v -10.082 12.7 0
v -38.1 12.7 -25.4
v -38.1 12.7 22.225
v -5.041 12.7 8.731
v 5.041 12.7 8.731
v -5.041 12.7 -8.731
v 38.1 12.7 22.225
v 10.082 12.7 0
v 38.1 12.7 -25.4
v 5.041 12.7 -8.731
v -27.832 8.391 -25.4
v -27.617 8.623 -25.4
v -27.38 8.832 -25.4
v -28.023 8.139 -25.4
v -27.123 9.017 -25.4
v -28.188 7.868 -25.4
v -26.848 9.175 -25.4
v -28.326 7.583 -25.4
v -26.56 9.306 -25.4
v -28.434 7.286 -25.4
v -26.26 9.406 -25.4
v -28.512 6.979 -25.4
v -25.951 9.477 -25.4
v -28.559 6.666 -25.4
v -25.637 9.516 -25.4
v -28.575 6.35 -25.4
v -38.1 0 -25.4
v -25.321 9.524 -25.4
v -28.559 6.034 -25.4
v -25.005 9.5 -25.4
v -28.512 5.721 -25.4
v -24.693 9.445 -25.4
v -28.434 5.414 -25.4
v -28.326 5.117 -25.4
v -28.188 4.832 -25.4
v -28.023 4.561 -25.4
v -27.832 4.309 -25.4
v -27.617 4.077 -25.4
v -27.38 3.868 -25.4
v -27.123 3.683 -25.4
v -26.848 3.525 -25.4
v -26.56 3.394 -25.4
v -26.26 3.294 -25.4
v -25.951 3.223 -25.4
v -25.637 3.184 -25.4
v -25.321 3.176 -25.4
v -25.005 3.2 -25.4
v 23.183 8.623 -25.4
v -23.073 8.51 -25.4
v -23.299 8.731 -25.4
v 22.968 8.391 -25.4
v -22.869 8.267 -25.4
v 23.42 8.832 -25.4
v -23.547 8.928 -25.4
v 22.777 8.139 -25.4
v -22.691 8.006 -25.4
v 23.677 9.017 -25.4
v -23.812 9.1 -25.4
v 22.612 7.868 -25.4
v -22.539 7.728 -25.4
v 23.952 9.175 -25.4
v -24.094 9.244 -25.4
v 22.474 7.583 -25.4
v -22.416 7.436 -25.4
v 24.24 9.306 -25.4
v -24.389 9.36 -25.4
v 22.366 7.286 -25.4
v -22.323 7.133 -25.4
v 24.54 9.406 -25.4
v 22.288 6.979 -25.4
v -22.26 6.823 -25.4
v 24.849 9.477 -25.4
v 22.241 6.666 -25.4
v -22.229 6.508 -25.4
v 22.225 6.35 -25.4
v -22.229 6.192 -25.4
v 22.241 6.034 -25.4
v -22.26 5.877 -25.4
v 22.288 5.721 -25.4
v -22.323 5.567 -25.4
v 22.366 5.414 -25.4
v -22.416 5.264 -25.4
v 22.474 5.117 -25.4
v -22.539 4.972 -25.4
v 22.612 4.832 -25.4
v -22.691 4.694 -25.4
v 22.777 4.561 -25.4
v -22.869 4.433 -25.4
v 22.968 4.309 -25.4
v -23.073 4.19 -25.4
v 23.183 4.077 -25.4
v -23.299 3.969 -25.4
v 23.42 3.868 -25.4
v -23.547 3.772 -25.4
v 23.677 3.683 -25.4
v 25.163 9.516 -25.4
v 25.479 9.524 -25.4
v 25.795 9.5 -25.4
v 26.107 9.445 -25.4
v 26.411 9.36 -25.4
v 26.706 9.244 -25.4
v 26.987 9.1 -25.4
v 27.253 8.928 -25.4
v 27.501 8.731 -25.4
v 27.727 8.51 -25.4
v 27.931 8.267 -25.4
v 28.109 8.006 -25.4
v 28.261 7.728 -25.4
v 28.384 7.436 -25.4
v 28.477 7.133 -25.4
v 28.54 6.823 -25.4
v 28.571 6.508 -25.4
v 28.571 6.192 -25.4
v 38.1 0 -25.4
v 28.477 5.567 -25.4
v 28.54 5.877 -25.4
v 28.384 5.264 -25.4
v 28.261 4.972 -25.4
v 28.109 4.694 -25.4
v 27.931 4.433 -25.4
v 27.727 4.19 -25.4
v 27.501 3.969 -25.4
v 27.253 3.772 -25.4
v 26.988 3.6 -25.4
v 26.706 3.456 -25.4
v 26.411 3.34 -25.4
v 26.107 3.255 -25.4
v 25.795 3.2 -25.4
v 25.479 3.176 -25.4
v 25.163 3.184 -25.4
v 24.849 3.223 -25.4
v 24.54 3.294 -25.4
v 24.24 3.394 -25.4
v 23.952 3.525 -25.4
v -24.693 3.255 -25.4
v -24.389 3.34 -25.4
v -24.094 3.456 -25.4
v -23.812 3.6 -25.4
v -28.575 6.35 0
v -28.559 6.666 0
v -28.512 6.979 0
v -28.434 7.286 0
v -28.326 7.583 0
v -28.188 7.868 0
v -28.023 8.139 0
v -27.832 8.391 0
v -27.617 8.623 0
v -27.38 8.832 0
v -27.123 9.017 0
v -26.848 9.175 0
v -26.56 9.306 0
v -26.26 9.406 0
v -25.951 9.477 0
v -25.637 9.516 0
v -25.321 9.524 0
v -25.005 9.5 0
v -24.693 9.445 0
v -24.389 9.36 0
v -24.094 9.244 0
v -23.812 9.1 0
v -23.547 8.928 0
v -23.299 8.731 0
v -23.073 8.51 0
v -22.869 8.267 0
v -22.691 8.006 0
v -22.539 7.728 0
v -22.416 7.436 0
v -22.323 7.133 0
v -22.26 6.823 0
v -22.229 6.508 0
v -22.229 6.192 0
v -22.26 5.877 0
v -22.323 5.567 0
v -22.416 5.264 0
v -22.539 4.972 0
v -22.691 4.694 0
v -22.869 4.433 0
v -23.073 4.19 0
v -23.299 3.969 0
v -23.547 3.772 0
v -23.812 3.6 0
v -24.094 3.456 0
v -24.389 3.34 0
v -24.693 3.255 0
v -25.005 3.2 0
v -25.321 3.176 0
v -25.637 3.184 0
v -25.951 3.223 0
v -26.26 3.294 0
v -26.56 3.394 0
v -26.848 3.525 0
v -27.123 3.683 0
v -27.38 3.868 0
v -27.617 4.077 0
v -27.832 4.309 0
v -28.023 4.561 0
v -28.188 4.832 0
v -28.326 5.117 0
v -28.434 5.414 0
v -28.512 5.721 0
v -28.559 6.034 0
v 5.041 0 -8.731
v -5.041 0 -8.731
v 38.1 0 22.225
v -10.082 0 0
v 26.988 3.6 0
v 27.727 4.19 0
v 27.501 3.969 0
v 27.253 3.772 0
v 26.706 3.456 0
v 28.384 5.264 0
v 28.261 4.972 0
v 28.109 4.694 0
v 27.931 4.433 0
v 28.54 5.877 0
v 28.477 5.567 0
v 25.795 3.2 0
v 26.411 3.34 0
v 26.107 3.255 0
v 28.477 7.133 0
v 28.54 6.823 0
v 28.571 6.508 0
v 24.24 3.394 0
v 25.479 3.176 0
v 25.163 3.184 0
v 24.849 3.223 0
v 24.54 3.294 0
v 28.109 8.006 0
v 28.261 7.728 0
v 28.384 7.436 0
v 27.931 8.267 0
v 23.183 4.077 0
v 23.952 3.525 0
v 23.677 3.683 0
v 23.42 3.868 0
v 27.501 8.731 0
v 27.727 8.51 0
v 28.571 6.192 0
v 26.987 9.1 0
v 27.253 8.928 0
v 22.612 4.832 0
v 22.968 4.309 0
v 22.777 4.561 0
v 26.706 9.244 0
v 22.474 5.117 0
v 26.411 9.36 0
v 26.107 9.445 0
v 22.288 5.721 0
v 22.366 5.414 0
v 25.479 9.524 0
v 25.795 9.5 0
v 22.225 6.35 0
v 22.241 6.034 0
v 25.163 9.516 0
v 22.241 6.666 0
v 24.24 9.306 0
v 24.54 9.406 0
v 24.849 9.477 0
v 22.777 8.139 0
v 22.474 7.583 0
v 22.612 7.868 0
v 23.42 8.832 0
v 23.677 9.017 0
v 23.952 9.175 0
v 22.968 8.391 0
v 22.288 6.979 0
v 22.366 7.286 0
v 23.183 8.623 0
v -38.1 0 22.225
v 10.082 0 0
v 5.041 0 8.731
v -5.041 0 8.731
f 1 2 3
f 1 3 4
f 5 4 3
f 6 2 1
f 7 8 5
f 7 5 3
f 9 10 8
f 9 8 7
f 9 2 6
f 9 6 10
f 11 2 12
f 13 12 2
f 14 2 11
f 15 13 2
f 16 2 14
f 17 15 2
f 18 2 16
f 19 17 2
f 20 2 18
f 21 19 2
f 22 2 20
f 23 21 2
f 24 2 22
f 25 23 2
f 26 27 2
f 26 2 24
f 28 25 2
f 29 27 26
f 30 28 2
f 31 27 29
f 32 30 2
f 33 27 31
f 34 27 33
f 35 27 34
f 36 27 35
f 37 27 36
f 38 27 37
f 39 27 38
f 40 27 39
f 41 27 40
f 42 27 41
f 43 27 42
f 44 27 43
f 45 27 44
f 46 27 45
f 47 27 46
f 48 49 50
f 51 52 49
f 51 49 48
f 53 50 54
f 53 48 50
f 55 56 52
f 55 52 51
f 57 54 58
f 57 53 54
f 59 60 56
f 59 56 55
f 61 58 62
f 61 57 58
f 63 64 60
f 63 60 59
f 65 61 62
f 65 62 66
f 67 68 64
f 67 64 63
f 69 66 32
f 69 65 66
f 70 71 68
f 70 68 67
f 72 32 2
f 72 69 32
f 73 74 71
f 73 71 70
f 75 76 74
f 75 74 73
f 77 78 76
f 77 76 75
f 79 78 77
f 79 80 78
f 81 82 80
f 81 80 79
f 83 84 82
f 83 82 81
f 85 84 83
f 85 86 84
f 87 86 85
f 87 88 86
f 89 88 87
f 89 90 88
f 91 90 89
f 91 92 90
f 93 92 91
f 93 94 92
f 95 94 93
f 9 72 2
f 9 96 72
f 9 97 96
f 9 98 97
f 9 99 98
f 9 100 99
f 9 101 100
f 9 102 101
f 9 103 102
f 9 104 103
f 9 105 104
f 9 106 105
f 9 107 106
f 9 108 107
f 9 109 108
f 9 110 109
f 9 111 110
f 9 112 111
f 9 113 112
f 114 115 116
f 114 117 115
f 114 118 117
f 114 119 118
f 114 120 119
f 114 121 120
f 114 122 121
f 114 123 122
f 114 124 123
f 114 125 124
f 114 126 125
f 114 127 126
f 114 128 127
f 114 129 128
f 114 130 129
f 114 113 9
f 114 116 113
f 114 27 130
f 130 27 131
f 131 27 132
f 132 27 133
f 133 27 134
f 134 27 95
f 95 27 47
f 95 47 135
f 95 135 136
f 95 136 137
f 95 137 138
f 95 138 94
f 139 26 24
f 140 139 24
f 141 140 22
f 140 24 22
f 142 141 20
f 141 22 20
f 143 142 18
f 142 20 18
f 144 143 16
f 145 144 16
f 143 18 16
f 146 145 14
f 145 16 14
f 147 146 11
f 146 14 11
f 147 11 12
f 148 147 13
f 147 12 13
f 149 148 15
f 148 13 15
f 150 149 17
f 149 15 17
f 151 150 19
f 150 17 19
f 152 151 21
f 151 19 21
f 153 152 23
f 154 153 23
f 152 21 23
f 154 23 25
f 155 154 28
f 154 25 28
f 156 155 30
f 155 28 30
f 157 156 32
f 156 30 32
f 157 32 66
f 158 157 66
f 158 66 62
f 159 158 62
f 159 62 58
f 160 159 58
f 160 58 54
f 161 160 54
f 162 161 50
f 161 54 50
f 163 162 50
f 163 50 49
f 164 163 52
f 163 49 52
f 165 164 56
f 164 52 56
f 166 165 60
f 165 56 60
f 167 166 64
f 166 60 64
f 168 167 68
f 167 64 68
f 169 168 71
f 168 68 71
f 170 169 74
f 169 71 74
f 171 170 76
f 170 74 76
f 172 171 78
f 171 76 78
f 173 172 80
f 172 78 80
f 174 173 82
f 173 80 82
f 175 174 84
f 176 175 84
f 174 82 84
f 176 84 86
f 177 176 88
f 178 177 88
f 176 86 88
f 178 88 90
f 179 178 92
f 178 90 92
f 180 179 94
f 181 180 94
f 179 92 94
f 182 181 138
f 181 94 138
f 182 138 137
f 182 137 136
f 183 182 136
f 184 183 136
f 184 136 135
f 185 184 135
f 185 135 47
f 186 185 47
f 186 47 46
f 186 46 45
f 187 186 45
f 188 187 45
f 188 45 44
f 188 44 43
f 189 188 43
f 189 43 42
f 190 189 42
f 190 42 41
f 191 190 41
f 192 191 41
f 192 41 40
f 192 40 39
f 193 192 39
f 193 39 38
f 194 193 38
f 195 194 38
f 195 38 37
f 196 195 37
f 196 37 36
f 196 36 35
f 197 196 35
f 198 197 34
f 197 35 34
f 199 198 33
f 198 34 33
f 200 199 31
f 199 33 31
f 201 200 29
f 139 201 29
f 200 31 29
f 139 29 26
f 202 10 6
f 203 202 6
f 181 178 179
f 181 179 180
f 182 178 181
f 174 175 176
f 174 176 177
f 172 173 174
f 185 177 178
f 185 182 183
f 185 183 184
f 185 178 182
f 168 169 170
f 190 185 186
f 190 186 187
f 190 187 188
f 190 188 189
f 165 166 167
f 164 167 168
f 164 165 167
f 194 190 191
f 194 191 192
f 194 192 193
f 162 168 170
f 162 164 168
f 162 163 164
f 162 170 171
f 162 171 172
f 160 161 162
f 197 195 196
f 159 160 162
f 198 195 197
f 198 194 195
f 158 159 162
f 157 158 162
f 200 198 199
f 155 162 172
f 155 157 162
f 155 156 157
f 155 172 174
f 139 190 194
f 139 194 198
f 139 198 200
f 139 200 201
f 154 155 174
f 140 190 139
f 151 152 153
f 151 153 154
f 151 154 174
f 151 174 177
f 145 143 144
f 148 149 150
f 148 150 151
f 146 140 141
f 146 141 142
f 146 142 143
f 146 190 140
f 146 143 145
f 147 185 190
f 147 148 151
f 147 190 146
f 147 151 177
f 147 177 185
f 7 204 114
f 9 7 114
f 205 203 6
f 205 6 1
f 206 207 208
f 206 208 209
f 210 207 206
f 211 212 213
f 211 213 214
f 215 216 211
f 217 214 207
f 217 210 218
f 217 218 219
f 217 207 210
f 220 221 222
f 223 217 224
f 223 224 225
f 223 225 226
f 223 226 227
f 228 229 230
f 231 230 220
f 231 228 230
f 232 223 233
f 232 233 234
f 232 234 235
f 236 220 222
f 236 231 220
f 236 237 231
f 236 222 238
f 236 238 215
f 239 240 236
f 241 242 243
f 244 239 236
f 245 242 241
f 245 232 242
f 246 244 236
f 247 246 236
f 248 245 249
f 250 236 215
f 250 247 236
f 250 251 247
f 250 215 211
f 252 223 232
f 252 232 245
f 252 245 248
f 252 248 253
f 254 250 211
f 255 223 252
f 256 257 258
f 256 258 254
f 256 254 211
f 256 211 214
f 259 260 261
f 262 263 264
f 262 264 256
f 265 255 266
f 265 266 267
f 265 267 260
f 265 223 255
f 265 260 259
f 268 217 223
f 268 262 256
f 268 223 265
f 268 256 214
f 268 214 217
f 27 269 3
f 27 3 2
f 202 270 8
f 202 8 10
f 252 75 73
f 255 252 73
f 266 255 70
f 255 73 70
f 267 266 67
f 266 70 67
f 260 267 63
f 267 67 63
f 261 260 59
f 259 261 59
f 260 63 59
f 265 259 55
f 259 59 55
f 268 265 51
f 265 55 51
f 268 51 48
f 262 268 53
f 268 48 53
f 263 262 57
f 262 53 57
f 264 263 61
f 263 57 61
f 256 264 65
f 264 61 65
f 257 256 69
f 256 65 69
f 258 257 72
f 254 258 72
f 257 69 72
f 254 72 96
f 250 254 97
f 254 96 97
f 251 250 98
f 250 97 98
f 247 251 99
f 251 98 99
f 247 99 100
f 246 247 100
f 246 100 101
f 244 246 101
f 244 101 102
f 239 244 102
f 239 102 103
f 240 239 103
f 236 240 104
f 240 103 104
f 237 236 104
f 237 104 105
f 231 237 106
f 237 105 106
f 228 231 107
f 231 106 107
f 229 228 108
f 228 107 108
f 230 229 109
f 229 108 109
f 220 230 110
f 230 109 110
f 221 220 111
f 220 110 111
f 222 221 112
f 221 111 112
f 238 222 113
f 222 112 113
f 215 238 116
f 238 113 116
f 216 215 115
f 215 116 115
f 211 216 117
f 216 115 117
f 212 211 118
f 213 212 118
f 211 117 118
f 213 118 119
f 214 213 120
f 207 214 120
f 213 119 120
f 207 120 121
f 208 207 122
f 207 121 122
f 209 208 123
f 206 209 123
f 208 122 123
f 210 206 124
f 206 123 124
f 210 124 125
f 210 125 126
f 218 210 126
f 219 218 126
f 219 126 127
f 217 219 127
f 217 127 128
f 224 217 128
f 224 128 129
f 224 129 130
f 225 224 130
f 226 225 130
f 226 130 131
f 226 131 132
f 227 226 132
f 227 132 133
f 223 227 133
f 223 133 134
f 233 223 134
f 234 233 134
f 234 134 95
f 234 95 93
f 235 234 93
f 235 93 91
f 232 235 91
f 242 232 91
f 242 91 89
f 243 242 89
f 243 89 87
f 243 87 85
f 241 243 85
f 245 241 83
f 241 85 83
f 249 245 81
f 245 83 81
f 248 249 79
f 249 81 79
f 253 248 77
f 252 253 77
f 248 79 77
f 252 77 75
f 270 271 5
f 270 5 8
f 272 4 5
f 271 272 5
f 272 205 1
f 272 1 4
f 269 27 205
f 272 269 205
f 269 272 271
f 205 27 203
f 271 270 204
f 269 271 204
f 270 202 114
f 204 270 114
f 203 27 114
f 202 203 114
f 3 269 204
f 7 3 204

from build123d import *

# Parameters (mm, degrees)
SKETCH1_W           = 76.2
SKETCH1_H           = 47.625
BOSS_EXTRUDE1_DEPTH = 12.7
SKETCH2_R           = 3.175
CUT_EXTRUDE1_DEPTH  = 25.4


with BuildPart() as part:
    # Sketch1 → Boss-Extrude1 (new body)
    with BuildSketch(Plane(origin=(0, 0, 0), x_dir=(1, 0, 0), z_dir=(0, 1, 0))):
        with Locations((0, 1.5875)):
            Rectangle(SKETCH1_W, SKETCH1_H)
        Polygon((10.081979076, 0), (5.040989538, 8.73125), (-5.040989538, 8.73125), (-10.081979076, 0), (-5.040989538, -8.73125), (5.040989538, -8.73125), align=None, mode=Mode.SUBTRACT)
    extrude(amount=BOSS_EXTRUDE1_DEPTH)

    # Sketch2 → Cut-Extrude1 (cut)
    with BuildSketch(Plane(origin=(0, 0, -25.4), x_dir=(-1, 0, 0), z_dir=(0, 0, -1))):
        with Locations((-25.4, 6.35)):
            Circle(SKETCH2_R)
        with Locations((25.4, 6.35)):
            Circle(SKETCH2_R)
    extrude(amount=-CUT_EXTRUDE1_DEPTH, mode=Mode.SUBTRACT)


solid = part.part
